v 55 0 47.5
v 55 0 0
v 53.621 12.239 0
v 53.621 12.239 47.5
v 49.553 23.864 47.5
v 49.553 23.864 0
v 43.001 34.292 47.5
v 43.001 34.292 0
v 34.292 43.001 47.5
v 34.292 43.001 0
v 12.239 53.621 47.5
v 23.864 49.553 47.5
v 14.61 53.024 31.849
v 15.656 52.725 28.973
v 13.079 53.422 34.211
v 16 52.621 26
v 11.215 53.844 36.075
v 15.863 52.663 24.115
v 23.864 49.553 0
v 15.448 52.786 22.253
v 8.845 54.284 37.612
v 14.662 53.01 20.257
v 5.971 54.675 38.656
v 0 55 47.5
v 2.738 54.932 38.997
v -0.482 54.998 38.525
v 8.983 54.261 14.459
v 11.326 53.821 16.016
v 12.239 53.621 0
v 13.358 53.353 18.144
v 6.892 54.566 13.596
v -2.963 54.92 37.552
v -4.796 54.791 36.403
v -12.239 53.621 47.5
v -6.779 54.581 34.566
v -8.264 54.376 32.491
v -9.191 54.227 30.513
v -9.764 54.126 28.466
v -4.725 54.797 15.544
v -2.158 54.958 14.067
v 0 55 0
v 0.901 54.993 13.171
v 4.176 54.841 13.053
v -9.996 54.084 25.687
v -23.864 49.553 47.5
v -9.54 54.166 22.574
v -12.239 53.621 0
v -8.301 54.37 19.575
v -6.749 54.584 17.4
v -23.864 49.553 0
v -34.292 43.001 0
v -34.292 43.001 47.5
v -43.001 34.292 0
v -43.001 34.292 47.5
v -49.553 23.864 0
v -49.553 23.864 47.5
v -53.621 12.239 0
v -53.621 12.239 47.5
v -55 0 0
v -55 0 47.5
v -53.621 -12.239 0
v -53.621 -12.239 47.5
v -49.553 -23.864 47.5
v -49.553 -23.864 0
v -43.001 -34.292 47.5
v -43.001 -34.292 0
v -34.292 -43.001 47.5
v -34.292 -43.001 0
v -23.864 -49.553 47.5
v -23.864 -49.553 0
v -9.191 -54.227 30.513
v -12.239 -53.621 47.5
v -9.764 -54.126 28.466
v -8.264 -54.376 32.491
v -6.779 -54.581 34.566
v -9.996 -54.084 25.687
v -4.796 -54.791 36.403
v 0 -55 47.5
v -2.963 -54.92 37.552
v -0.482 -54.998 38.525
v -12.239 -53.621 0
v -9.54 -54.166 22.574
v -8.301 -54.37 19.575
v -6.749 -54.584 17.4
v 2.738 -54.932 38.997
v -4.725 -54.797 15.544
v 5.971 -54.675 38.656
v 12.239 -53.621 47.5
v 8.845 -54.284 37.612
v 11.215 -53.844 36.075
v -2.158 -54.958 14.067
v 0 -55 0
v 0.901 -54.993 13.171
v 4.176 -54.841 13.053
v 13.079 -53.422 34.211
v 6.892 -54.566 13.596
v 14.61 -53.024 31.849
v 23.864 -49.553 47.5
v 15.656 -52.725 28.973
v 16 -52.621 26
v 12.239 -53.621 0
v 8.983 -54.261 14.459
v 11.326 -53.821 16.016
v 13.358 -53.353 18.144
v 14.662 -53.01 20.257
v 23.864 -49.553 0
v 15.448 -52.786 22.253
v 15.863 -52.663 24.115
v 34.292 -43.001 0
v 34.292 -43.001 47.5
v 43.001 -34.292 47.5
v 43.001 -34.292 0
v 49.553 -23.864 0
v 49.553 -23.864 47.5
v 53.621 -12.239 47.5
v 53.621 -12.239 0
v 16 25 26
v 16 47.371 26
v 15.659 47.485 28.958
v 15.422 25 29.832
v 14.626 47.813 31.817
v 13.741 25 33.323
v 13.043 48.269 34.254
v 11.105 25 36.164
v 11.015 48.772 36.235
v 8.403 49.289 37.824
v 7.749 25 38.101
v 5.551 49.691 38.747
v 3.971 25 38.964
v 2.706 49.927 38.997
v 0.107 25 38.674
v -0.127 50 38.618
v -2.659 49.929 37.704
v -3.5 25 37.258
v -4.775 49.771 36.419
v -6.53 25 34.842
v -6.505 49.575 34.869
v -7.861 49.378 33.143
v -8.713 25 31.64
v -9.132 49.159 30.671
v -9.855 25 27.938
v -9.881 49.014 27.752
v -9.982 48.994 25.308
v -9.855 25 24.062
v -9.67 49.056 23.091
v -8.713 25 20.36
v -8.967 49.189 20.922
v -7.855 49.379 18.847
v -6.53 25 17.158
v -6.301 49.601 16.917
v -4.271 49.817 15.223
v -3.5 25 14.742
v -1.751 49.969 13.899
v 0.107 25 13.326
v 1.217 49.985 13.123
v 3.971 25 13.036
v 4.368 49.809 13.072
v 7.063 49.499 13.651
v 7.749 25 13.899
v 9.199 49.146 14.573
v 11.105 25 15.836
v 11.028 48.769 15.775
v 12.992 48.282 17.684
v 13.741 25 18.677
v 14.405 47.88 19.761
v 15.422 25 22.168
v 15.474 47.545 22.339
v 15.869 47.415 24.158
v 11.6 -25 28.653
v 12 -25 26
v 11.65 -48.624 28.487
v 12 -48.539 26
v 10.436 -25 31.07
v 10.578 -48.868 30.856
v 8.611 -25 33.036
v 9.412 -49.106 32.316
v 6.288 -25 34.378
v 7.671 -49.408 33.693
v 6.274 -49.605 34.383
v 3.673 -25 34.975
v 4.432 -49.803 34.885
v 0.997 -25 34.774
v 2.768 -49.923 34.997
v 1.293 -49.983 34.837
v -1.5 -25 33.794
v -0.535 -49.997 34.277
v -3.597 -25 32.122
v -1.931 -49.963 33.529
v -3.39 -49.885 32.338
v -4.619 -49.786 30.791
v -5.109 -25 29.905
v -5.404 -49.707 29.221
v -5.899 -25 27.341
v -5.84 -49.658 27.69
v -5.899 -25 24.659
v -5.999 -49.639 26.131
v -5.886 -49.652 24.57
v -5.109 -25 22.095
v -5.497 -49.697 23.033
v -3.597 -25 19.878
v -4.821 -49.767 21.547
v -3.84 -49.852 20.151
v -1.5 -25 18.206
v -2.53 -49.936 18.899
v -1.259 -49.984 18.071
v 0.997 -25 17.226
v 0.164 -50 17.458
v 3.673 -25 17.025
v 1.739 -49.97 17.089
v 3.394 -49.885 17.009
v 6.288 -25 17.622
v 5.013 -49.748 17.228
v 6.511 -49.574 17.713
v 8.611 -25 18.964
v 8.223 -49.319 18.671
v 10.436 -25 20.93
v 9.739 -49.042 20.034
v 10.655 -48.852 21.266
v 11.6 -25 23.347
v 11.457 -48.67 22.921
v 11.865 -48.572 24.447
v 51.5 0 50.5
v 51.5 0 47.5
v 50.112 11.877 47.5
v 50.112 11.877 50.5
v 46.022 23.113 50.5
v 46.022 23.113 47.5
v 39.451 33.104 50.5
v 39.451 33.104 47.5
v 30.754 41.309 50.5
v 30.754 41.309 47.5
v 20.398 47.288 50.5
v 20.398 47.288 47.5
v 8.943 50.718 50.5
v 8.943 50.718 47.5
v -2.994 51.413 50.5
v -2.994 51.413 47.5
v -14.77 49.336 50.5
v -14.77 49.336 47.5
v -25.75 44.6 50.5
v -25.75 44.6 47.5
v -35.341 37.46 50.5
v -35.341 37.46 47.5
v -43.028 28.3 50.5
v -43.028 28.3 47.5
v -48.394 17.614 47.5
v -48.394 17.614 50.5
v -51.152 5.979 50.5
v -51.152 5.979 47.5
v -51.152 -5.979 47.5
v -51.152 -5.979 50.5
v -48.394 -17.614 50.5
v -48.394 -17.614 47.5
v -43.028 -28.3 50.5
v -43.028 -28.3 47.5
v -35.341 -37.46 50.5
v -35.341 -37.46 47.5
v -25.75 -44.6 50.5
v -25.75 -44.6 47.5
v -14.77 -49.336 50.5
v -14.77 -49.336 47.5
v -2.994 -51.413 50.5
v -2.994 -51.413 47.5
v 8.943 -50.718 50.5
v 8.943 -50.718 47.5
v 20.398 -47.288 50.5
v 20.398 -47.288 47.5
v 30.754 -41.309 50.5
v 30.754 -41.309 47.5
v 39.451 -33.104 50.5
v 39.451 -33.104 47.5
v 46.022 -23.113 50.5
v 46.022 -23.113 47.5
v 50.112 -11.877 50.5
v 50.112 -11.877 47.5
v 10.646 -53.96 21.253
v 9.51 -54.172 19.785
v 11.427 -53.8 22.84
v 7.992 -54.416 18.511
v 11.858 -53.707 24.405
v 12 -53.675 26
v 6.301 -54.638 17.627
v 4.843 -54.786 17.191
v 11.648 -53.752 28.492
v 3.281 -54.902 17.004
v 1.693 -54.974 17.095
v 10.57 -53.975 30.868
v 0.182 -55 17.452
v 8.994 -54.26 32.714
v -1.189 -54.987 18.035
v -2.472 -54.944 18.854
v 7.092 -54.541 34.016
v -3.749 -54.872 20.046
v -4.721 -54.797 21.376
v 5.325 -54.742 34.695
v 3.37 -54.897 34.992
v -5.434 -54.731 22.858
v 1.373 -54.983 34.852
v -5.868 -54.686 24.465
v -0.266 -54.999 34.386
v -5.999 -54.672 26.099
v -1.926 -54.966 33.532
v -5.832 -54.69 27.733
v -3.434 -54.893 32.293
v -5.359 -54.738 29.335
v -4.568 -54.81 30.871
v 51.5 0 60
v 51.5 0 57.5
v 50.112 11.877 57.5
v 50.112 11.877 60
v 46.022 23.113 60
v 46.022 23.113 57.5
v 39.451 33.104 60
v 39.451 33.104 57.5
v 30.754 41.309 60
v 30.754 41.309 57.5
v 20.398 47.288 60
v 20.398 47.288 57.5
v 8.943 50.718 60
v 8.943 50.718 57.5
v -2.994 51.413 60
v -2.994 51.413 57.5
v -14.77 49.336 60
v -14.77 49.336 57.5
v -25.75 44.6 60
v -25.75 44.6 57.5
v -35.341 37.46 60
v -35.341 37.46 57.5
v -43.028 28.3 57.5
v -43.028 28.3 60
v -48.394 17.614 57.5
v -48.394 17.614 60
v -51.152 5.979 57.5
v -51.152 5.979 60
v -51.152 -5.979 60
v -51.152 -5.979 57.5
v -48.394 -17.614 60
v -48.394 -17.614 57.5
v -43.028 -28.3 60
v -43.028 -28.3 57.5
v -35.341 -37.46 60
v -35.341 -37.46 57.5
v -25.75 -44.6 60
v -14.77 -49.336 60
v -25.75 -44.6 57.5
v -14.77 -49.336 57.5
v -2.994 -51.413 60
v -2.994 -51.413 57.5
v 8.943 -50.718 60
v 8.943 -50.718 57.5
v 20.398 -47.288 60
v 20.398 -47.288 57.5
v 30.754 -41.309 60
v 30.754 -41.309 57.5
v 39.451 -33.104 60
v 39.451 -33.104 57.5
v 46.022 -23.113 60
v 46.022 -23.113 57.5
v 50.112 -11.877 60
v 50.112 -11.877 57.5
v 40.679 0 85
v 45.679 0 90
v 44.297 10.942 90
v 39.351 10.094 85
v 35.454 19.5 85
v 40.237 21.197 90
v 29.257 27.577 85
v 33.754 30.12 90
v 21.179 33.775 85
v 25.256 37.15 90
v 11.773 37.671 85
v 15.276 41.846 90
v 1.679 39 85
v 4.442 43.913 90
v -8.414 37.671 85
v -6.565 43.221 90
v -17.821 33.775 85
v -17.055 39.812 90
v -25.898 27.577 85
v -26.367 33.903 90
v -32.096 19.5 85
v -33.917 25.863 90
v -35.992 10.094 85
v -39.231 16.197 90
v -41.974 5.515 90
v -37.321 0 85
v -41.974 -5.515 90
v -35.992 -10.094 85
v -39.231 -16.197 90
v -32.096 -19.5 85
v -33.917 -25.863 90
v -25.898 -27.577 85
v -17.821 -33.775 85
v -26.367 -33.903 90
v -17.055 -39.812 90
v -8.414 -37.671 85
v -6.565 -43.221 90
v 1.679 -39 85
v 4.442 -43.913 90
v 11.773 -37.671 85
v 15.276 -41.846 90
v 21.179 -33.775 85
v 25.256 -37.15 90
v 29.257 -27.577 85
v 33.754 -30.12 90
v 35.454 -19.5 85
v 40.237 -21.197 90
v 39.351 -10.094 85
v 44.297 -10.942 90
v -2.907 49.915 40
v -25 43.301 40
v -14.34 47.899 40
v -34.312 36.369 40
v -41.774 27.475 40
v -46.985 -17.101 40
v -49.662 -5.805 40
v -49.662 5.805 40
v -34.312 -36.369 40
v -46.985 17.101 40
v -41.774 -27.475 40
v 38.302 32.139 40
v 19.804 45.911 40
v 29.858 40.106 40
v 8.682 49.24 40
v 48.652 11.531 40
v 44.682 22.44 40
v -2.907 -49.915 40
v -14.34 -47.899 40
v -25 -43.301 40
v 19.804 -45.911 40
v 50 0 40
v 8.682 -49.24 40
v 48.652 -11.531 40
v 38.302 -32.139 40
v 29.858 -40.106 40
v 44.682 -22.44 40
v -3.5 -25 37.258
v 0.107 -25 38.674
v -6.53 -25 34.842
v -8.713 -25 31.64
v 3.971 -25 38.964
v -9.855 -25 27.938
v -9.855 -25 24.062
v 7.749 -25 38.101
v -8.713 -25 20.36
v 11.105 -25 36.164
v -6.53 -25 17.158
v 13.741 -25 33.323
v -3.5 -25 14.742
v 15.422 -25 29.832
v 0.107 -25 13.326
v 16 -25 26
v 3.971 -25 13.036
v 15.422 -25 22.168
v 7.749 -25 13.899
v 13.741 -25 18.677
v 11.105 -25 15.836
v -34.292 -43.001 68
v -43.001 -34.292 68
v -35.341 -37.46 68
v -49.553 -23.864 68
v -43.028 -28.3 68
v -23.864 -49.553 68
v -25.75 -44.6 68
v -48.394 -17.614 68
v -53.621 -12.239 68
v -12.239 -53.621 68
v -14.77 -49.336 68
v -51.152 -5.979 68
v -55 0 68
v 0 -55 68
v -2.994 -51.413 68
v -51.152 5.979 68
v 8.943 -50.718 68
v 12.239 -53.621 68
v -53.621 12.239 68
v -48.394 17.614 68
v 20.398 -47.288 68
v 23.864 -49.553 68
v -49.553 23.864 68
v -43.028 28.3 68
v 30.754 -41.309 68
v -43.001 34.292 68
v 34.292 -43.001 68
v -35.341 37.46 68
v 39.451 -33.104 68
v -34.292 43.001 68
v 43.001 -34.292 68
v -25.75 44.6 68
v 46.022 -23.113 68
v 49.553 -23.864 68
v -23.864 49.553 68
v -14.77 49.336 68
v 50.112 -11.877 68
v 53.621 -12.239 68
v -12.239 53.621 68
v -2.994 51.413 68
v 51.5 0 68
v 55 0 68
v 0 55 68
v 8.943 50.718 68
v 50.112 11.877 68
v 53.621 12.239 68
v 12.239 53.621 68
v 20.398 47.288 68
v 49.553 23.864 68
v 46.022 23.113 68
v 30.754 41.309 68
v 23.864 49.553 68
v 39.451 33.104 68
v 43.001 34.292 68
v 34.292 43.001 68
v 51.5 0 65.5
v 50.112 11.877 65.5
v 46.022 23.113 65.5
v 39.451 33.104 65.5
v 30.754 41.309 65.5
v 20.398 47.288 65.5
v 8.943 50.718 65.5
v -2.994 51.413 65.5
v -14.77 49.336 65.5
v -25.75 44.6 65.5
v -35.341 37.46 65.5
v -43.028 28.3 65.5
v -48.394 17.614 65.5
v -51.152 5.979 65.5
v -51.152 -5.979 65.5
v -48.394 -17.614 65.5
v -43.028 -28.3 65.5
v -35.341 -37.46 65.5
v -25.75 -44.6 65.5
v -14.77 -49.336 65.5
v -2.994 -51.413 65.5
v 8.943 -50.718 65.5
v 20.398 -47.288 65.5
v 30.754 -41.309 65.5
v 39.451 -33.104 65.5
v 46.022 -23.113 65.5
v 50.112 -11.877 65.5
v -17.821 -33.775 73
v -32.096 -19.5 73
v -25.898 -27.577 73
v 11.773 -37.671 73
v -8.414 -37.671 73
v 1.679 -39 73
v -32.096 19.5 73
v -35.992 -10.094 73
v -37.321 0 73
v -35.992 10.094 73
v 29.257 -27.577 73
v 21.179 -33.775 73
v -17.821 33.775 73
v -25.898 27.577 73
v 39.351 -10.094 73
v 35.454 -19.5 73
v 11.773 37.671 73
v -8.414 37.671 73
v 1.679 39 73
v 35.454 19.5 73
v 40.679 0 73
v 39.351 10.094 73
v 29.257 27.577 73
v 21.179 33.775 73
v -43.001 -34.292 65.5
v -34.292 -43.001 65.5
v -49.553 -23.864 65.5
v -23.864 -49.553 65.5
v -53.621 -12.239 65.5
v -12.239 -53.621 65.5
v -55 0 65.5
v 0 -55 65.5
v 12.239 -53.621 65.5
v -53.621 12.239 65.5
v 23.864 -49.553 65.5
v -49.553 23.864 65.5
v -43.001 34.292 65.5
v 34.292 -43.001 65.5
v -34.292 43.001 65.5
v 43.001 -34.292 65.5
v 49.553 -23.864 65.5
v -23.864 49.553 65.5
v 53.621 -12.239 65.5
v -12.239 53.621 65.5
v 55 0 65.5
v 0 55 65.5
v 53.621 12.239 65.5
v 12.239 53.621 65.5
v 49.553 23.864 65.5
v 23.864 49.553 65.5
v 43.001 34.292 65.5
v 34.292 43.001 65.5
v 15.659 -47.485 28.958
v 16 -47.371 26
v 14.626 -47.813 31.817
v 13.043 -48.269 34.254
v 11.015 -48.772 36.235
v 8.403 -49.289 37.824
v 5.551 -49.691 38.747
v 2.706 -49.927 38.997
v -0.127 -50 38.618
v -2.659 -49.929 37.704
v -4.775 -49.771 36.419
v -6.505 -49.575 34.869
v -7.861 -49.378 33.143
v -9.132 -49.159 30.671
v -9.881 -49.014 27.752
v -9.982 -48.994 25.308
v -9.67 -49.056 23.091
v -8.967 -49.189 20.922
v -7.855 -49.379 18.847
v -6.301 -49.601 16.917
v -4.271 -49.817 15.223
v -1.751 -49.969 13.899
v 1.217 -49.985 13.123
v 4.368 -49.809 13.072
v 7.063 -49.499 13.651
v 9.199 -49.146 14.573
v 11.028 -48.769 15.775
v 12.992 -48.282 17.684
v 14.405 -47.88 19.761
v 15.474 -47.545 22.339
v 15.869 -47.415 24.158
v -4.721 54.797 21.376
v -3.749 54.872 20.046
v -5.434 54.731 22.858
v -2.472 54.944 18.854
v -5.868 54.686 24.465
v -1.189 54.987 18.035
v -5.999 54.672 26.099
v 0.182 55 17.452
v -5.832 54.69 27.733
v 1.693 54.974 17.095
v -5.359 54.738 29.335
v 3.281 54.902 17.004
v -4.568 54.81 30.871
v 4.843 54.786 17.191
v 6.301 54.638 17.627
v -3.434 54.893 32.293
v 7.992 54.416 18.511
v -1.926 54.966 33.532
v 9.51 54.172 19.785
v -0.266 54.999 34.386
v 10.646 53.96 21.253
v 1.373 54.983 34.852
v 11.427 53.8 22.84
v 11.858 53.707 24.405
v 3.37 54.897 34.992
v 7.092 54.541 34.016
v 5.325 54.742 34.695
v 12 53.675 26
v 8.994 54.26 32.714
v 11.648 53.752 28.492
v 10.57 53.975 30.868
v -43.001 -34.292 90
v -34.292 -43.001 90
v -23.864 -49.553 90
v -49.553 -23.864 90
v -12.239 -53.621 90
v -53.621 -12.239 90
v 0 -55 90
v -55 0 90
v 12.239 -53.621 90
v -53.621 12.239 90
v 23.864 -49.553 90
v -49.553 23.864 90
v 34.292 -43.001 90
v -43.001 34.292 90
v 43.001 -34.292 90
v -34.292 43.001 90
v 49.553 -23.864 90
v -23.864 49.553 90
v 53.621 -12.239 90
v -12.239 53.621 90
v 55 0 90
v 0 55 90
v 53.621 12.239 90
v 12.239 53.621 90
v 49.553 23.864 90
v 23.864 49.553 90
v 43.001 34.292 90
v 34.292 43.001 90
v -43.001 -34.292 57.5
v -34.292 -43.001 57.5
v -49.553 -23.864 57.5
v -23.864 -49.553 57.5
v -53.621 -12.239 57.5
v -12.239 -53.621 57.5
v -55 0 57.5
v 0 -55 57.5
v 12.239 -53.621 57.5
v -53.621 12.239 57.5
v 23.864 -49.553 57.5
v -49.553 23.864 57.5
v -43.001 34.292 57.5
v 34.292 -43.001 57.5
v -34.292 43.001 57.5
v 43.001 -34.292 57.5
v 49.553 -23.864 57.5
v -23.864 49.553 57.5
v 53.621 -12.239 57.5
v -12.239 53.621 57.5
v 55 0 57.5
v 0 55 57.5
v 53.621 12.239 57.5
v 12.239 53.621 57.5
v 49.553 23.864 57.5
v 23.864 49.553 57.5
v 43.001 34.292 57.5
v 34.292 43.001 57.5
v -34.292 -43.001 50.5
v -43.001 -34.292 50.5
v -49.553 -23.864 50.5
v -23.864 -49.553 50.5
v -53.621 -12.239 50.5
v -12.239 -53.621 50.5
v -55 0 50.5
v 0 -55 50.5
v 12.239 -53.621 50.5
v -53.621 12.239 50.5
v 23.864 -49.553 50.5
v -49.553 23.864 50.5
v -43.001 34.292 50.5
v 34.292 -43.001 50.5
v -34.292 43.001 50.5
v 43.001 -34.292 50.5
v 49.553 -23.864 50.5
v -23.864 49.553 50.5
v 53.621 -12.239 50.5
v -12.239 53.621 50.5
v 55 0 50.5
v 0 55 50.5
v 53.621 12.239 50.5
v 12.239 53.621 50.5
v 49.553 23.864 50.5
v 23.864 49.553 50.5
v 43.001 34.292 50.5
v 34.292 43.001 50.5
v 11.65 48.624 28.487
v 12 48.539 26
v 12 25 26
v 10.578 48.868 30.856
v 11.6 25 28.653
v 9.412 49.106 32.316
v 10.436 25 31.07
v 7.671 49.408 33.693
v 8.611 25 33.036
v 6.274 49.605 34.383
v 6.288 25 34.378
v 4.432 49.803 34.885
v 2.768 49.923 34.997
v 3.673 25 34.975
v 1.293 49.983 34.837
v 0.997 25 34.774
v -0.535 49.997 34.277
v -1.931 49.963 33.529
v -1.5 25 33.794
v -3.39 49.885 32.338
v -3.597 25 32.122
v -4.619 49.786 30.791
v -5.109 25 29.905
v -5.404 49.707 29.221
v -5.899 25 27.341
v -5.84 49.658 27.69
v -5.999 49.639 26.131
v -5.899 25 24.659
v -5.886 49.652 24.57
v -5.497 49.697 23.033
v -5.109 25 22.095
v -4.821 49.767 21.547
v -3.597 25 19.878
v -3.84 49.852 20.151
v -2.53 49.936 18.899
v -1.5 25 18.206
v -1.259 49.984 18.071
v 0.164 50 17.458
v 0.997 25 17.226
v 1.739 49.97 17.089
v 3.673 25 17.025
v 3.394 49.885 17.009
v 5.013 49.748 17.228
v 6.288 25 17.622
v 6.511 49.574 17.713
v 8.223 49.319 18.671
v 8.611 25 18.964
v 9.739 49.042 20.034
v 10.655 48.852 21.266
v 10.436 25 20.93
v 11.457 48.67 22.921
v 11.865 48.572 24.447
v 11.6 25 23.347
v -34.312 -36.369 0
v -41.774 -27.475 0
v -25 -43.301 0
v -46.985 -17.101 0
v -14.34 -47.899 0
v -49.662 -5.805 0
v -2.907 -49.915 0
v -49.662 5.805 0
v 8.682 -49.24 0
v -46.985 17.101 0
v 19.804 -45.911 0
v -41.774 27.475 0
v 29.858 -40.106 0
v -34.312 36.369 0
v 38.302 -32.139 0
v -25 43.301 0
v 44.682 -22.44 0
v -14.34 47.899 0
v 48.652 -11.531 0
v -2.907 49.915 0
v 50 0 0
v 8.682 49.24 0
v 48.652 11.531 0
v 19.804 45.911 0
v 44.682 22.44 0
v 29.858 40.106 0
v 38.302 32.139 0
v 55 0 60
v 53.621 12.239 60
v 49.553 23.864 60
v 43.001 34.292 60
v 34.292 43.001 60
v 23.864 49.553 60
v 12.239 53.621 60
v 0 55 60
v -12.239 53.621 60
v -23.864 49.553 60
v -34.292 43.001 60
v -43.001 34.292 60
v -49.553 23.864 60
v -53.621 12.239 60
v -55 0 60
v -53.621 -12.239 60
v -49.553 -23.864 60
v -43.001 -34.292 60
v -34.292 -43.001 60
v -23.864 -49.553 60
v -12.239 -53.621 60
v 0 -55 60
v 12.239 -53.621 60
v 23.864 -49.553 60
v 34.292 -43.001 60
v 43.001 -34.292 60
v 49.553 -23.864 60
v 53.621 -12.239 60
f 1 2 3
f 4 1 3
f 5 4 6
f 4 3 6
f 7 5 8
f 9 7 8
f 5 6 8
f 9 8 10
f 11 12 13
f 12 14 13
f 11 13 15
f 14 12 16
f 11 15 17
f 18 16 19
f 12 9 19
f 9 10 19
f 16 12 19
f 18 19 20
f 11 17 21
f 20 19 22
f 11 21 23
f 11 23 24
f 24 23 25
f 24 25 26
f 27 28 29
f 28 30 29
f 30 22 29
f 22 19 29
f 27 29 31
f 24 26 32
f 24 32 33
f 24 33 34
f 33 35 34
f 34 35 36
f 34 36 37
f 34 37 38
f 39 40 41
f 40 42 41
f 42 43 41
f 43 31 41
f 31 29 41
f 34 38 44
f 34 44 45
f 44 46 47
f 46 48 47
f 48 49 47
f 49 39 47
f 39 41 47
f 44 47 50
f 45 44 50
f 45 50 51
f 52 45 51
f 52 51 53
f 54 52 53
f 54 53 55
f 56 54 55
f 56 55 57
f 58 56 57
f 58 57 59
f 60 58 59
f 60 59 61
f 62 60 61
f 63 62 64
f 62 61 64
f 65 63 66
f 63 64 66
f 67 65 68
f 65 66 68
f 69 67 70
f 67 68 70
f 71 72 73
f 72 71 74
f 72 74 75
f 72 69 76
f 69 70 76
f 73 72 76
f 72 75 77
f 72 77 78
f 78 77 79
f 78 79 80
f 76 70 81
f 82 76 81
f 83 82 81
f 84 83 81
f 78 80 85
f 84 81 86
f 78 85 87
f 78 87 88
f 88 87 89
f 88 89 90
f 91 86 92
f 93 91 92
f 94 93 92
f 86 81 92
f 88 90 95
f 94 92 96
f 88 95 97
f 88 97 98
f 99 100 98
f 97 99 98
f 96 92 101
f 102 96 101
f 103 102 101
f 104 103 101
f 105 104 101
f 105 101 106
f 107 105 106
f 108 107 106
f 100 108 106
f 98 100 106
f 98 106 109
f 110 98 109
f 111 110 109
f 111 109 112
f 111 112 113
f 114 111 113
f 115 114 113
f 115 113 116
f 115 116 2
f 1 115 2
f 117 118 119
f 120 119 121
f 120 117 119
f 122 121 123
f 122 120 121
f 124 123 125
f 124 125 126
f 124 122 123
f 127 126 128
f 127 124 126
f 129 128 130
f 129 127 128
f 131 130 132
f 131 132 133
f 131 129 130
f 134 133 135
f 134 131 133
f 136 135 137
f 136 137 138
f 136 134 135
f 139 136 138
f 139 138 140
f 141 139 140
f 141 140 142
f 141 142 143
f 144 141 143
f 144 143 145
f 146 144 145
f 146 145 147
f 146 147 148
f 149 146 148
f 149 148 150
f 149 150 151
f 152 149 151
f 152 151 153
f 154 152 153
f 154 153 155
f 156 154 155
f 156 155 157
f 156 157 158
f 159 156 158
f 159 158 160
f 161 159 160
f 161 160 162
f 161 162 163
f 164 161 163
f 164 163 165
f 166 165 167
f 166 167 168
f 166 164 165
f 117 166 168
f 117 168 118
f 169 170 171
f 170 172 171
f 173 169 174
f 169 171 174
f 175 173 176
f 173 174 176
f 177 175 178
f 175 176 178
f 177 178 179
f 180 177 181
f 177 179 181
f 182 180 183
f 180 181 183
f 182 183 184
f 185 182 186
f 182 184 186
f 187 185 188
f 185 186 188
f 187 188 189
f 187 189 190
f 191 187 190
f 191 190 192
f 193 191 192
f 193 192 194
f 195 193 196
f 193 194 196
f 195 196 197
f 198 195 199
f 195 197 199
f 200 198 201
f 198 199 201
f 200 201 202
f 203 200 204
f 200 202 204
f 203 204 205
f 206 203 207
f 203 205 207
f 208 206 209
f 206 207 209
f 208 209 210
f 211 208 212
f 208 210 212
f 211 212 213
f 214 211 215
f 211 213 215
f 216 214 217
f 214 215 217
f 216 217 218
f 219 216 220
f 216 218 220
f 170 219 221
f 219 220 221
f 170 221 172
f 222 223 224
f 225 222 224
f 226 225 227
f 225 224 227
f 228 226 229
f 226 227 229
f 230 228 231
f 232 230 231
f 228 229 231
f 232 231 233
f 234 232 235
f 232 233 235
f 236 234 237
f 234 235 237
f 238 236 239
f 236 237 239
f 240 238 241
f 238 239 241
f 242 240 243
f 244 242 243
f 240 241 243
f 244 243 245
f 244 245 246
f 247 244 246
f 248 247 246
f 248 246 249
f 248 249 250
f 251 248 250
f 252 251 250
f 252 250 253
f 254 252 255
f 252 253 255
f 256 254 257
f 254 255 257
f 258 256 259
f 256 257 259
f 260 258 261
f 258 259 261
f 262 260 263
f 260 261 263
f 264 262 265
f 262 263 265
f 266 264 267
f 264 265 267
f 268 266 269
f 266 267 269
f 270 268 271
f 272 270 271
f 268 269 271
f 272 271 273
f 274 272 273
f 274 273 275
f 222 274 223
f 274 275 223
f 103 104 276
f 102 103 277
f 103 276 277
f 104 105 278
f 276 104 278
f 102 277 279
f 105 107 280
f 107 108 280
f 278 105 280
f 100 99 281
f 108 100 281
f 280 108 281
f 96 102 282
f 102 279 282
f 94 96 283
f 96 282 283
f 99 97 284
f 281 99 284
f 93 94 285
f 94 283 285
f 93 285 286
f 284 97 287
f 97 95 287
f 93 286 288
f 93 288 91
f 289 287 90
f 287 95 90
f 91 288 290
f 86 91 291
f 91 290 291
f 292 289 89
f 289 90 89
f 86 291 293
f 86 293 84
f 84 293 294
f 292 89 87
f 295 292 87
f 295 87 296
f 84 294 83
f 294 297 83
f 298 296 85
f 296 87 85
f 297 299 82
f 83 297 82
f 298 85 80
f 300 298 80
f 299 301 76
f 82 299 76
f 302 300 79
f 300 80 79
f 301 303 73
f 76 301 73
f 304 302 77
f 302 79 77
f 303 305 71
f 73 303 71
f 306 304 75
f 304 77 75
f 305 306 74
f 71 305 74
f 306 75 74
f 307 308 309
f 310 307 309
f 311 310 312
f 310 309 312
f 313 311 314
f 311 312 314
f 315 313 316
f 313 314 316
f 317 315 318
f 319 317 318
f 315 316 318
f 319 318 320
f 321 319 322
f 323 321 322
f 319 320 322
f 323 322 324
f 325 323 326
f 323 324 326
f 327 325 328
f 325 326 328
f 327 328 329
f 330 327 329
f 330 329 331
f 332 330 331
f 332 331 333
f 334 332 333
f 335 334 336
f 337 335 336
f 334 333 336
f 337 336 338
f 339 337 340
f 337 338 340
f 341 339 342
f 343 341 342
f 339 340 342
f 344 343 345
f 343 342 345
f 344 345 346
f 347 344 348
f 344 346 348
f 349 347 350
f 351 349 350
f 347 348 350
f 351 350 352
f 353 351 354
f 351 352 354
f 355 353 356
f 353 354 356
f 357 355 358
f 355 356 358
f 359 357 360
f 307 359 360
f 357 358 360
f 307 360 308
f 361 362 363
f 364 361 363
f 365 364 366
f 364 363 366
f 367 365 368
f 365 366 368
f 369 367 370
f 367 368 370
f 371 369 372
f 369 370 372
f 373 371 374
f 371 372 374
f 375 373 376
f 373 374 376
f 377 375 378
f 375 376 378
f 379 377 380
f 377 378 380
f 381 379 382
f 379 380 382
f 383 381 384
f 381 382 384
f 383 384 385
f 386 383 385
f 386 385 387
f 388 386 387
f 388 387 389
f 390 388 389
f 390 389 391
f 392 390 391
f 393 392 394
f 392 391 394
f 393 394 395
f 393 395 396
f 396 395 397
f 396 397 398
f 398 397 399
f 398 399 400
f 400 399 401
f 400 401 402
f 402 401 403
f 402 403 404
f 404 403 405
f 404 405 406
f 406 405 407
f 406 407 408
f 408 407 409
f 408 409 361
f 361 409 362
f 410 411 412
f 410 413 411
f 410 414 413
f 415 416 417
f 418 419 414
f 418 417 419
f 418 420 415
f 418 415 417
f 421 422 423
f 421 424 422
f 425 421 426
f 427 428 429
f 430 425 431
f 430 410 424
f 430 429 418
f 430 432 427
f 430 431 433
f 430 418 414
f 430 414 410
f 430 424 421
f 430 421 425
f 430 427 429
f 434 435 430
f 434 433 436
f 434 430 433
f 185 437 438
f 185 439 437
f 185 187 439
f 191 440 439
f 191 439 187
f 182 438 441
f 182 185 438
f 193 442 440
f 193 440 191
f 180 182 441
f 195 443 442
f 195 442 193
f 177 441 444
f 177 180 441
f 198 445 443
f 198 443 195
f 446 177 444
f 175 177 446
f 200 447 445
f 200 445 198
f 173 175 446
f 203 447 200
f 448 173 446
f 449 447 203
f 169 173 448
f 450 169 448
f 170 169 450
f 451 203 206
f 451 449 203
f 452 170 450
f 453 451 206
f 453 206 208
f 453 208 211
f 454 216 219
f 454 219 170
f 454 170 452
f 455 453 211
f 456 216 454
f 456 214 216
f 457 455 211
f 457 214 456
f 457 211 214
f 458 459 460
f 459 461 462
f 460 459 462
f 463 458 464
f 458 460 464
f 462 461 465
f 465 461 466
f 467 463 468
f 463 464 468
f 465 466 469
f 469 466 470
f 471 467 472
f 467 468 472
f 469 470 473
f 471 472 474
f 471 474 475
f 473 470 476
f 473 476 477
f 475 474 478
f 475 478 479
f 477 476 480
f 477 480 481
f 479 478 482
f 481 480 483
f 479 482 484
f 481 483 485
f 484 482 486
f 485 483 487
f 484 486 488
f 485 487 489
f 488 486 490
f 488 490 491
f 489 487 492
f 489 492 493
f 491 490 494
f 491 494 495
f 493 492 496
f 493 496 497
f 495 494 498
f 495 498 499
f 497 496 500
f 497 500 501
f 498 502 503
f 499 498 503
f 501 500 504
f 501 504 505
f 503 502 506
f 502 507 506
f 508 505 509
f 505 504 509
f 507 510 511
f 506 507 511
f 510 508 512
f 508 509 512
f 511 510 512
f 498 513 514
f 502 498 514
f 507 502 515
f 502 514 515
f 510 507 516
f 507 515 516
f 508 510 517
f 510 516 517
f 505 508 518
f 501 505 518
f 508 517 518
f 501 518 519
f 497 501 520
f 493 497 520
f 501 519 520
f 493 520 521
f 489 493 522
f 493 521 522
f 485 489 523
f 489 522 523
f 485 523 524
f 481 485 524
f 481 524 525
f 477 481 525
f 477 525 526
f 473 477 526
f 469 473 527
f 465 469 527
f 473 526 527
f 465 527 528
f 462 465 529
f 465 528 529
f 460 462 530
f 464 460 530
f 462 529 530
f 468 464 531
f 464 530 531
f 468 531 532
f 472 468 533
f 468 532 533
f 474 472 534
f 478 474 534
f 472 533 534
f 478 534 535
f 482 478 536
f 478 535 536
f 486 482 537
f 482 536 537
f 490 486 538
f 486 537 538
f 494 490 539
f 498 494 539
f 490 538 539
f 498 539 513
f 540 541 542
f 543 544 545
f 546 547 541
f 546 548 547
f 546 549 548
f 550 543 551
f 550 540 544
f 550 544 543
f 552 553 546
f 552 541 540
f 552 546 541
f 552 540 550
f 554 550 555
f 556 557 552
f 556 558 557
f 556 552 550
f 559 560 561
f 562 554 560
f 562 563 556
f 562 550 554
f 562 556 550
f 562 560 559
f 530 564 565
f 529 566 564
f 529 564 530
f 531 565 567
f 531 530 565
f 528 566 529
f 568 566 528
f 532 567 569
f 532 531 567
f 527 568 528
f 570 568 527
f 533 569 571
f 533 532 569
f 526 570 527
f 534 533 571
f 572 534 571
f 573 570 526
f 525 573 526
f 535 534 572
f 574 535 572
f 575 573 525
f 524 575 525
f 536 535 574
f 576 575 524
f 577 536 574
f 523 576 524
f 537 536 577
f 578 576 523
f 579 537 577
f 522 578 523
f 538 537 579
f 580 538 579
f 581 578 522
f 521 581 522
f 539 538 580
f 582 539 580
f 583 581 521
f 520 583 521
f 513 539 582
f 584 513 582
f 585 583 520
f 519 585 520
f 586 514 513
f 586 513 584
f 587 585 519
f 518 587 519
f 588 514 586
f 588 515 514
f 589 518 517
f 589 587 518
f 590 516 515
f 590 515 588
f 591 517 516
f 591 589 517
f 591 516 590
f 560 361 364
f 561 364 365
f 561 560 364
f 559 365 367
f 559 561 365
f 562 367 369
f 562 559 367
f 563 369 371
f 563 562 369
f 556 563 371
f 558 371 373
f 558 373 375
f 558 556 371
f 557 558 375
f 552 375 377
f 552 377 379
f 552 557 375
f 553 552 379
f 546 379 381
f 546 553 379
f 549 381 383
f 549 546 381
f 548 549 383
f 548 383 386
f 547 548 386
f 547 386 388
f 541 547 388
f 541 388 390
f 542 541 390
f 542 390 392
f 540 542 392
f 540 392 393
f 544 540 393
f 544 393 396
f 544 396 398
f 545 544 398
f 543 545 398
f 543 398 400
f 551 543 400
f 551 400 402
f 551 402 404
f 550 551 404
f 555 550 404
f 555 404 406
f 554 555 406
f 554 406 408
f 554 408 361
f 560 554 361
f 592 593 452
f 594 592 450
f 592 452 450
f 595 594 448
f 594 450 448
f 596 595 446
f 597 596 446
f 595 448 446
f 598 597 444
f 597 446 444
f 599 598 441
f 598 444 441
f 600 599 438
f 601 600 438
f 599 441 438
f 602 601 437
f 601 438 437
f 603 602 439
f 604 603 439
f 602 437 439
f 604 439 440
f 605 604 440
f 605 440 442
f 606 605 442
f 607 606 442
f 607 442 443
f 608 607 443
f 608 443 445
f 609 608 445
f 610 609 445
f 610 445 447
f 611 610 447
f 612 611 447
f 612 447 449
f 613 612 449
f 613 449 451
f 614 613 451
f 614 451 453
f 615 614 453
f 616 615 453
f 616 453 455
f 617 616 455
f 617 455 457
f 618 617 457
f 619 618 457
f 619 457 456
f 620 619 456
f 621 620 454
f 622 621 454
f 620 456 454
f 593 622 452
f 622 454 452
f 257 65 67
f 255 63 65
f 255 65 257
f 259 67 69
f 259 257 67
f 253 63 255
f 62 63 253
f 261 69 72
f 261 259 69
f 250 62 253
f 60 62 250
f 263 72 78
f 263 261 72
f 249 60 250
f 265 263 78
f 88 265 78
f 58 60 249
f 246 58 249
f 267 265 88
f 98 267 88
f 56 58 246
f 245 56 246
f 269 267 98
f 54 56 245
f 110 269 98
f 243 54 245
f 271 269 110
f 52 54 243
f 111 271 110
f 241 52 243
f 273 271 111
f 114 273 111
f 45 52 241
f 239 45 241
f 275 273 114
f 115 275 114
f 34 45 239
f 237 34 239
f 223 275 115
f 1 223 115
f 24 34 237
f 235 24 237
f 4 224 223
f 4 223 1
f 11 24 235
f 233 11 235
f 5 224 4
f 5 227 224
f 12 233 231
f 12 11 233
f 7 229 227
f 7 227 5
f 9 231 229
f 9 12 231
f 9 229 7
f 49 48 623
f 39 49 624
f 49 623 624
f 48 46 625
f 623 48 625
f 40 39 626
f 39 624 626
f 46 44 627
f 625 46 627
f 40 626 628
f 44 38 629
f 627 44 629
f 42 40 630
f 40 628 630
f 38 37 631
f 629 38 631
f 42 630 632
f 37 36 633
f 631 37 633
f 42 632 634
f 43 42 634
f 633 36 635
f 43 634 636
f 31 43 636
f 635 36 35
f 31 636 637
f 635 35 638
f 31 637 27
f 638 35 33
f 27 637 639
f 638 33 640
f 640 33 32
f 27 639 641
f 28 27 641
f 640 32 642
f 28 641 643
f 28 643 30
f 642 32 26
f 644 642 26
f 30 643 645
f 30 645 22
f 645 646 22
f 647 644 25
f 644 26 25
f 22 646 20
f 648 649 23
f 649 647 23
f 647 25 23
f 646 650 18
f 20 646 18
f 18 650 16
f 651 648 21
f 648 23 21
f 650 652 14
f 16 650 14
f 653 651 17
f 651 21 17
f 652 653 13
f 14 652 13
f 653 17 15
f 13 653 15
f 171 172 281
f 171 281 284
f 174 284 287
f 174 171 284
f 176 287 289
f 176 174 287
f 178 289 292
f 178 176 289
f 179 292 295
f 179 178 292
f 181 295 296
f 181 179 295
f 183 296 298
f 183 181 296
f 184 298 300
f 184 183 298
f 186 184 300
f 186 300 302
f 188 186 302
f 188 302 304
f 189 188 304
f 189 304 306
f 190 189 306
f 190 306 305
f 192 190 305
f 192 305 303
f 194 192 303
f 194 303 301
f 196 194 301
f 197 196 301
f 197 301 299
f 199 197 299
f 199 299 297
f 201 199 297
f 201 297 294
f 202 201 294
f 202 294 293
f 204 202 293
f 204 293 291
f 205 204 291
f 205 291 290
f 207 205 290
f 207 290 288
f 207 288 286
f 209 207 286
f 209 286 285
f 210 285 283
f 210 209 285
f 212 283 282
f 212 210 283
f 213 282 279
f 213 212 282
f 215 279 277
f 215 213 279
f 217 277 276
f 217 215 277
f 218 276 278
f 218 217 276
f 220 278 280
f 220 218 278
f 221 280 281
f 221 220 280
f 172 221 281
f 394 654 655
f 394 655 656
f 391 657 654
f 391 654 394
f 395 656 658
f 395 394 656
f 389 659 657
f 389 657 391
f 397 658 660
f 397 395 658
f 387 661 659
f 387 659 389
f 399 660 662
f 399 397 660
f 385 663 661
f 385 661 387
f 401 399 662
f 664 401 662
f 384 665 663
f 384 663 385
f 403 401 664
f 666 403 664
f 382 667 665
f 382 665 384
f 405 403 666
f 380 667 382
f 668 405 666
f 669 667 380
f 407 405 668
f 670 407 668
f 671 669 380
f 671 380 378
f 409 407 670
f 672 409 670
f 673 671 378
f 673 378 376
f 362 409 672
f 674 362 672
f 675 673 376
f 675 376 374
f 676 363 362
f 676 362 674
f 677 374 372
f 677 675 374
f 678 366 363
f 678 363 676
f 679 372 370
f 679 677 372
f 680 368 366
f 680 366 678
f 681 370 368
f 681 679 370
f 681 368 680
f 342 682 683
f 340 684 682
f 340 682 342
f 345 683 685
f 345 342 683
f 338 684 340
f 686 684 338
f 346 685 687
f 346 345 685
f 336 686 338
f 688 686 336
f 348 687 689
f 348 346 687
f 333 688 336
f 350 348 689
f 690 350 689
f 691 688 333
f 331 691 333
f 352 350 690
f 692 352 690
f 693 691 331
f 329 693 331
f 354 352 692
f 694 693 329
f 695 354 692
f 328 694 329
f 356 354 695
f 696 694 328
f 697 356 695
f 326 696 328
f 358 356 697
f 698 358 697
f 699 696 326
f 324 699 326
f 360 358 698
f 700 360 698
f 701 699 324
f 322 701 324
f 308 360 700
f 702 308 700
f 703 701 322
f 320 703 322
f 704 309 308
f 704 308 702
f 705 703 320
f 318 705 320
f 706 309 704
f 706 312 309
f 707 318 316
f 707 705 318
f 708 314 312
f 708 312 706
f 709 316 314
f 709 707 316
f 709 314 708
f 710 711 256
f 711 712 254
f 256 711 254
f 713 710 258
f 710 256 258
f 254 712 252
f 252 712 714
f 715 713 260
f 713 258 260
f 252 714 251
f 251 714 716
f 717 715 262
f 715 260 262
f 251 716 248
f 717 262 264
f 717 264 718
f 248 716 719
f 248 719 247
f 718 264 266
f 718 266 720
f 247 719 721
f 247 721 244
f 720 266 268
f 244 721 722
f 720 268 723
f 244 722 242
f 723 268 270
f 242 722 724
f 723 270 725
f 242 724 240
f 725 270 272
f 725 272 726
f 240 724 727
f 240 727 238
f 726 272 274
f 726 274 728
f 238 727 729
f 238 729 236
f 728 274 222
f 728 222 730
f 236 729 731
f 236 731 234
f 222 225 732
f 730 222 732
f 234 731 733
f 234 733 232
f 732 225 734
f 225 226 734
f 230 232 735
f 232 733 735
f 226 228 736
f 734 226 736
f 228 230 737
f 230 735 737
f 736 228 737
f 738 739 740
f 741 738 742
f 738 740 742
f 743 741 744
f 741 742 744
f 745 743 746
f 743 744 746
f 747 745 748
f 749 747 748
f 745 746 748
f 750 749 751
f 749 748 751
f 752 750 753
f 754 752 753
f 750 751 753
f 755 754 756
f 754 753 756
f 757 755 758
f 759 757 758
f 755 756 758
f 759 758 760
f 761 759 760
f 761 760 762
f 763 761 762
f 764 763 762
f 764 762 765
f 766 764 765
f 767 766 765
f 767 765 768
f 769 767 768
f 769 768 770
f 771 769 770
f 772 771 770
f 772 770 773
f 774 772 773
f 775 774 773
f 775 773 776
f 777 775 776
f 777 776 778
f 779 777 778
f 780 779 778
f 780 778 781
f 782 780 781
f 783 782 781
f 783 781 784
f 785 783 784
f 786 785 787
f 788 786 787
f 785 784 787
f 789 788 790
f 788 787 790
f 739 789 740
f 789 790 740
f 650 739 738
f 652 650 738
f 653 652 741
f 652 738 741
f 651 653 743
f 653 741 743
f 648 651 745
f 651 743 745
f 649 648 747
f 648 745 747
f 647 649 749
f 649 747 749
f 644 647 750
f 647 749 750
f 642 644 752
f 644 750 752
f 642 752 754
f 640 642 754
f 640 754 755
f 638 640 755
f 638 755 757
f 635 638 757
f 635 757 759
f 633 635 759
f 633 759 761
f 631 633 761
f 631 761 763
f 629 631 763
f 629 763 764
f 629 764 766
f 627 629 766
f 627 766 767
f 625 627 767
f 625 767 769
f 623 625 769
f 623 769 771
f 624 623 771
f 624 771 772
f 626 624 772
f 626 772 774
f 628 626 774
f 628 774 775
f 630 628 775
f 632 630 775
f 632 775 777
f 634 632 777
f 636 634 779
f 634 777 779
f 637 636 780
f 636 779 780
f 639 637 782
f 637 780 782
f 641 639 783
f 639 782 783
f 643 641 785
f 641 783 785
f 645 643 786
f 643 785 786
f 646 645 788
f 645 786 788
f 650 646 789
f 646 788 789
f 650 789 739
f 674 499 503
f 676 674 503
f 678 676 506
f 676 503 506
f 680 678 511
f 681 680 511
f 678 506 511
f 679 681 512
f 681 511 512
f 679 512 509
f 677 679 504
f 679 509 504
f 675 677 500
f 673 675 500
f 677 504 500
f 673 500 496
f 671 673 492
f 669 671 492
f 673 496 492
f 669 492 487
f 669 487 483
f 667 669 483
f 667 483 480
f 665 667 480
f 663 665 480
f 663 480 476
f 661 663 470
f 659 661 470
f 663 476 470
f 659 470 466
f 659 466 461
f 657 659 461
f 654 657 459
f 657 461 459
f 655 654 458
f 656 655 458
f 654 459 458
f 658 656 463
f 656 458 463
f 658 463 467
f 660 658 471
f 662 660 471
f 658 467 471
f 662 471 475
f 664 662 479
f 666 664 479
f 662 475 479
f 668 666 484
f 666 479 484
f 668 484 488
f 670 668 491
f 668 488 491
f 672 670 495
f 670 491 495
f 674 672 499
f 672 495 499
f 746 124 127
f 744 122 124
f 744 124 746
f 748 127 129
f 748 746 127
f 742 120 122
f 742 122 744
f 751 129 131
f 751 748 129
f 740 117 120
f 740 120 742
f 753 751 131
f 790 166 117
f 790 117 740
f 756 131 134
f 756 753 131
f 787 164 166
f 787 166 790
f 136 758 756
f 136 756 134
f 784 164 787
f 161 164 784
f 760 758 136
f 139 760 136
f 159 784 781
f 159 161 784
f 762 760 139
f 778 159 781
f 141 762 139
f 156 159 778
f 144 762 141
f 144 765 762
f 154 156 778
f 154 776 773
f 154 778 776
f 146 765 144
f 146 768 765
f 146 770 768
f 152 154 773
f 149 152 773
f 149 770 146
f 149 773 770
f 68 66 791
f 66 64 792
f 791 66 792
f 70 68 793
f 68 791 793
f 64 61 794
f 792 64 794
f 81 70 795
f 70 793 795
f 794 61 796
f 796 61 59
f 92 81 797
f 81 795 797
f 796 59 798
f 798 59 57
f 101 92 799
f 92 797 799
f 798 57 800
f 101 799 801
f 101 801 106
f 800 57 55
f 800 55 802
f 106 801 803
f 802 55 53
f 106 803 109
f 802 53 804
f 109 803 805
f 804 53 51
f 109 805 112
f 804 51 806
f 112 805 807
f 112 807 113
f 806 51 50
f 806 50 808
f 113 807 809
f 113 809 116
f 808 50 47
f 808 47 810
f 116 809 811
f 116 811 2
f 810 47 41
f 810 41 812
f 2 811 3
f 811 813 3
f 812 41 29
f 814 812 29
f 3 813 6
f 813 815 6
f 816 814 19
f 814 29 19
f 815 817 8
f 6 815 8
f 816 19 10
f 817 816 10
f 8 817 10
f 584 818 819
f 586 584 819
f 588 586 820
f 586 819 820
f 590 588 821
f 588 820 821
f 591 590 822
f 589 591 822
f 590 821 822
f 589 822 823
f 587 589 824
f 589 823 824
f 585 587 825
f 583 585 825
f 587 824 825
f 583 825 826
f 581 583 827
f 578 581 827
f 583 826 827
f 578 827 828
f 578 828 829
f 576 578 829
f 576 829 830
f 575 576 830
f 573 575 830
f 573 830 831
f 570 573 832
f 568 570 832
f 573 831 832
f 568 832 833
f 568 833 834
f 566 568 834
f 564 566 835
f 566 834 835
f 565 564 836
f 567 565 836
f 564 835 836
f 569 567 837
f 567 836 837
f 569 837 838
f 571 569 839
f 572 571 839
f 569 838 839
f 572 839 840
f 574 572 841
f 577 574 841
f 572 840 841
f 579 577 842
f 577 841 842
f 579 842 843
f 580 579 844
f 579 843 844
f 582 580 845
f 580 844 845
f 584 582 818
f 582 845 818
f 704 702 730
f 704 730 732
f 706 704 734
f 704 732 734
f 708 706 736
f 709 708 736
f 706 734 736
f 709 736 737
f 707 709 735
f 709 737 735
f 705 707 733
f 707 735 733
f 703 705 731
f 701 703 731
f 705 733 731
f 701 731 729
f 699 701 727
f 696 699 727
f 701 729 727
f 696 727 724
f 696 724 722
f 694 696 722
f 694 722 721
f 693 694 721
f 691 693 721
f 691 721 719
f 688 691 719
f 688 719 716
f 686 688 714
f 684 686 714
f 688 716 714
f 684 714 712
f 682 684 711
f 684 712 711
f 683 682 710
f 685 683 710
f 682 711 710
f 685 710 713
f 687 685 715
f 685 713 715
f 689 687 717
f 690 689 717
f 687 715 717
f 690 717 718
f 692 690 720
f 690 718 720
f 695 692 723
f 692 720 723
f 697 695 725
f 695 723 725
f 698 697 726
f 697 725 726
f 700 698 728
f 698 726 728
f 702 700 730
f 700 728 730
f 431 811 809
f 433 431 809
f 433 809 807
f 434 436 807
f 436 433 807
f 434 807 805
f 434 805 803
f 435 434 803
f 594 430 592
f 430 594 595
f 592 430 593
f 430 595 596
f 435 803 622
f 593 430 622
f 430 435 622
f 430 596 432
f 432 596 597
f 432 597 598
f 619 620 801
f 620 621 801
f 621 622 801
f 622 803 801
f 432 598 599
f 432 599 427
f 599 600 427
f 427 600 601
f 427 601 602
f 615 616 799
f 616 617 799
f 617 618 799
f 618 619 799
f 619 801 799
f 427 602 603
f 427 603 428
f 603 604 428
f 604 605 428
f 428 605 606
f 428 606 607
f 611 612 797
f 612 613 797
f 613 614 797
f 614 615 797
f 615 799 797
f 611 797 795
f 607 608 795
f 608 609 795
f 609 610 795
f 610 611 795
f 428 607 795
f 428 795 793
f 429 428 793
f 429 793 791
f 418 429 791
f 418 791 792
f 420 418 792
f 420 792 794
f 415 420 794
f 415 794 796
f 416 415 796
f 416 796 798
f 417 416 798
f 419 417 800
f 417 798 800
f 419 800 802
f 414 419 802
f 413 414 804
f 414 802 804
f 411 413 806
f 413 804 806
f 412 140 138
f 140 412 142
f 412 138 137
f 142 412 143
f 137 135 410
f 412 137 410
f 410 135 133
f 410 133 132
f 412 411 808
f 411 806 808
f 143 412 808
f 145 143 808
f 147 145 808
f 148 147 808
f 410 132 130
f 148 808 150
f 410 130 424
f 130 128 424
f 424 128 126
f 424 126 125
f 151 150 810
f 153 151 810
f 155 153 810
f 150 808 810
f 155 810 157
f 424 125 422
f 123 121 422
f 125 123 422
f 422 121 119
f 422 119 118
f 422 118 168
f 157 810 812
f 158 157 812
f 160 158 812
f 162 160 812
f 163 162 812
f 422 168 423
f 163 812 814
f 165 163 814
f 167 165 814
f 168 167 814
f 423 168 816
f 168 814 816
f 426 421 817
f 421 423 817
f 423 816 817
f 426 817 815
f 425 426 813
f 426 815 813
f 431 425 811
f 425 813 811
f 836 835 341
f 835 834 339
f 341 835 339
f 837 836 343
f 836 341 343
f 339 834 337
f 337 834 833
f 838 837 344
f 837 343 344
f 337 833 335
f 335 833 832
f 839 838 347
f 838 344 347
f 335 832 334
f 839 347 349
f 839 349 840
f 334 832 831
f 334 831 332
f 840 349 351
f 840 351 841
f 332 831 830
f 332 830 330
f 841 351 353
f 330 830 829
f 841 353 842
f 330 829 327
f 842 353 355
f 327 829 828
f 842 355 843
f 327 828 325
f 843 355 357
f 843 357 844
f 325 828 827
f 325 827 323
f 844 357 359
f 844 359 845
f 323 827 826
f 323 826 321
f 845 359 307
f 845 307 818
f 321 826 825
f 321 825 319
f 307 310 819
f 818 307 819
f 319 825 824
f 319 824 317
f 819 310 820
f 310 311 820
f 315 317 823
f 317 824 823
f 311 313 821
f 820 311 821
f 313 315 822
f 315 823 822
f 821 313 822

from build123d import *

# Parameters (mm, degrees)
F0_R           = 55
F1_DEPTH       = 47.5
F2_R           = 51.5
F3_DEPTH       = 3
F4_R           = 55
F5_DEPTH       = 7
F6_R           = 51.5
F7_DEPTH       = 2.5
F8_R           = 55
F9_DEPTH       = 5.5
F10_R          = 51.5
F11_DEPTH      = 2.5
F12_R          = 55
F12_R_2        = 39
F13_DEPTH      = 22
F14_R          = 50
F15_DEPTH      = 40
F16_R          = 43.5007627275
F17_DEPTH      = 5
F18_SIZE       = 5
F19_R          = 13
F19_R_2        = 9
F20_DEPTH      = 62
F20_DEPTH_BACK = 70.1
F21_R          = 9
F22_DEPTH      = 75.8
F22_DEPTH_BACK = 99.3
F24_DEPTH      = 40
F25_R          = 82.1696032424
F25_R_2        = 55
F26_DEPTH      = 32.2


with BuildPart() as f1:
    # F0 (on Top) → F1 (new body)
    with BuildSketch(Plane.XY):
        Circle(F0_R)
    extrude(amount=F1_DEPTH)

    # F2 (on face) → F3 (join)
    with BuildSketch(Plane.XY.offset(47.5)):
        Circle(F2_R)
    extrude(amount=F3_DEPTH)

    # F4 (on face) → F5 (join)
    with BuildSketch(Plane.XY.offset(50.5)):
        Circle(F4_R)
    extrude(amount=F5_DEPTH)

    # F6 (on face) → F7 (join)
    with BuildSketch(Plane.XY.offset(57.5)):
        Circle(F6_R)
    extrude(amount=F7_DEPTH)

    # F8 (on face) → F9 (join)
    with BuildSketch(Plane.XY.offset(60)):
        Circle(F8_R)
    extrude(amount=F9_DEPTH)

    # F10 (on face) → F11 (join)
    with BuildSketch(Plane.XY.offset(65.5)):
        Circle(F10_R)
    extrude(amount=F11_DEPTH)

    # F12 (on face) → F13 (join)
    with BuildSketch(Plane.XY.offset(68)):
        Circle(F12_R)
        with Locations((1.679461333, 0)):
            Circle(F12_R_2, mode=Mode.SUBTRACT)
    extrude(amount=F13_DEPTH)

    # F14 (on face) → F15 (cut)
    with BuildSketch(Plane(origin=(0, 0, 0), x_dir=(1, 0, 0), z_dir=(0, 0, -1))):
        Circle(F14_R)
    extrude(amount=-F15_DEPTH, mode=Mode.SUBTRACT)

    # F16 (on face) → F17 (join)
    with BuildSketch(Plane.XY.offset(68)):
        Circle(F16_R)
    extrude(amount=F17_DEPTH)

    # F18
    f18_edges = [f1.edges().sort_by_distance(p)[0] for p in [
        (-37.320539, 0, 90),
    ]]
    chamfer(f18_edges, length=F18_SIZE)

    # F19 (on Front) → F20 (join, two sides)
    with BuildSketch(Plane.XZ) as f20_sk:
        with Locations((3, 26)):
            Circle(F19_R)
        with Locations((3, 26)):
            Circle(F19_R_2, mode=Mode.SUBTRACT)
    extrude(amount=F20_DEPTH)
    extrude(f20_sk.sketch, amount=-F20_DEPTH_BACK)

    # F21 (on Front) → F22 (cut, two sides)
    with BuildSketch(Plane.XZ) as f22_sk:
        with Locations((3, 26)):
            Circle(F21_R)
    extrude(amount=-F22_DEPTH, mode=Mode.SUBTRACT)
    extrude(f22_sk.sketch, amount=F22_DEPTH_BACK, mode=Mode.SUBTRACT)

    # F23 (on Top) → F24 (cut)
    with BuildSketch(Plane.XY):
        with BuildLine():
            Line((-10, 25), (-10, 48.9897948557))
            ThreePointArc((-10, 48.9897948557), (-50, 0), (-10, -48.9897948557))
            Line((-10, -48.9897948557), (-10, -25))
            Line((-10, -25), (16, -25))
            Line((16, -25), (16, -47.3708771293))
            ThreePointArc((16, -47.3708771293), (50, 0), (16, 47.3708771293))
            Line((16, 47.3708771293), (16, 25))
            Line((16, 25), (-10, 25))
        make_face()
    extrude(amount=F24_DEPTH, mode=Mode.SUBTRACT)

    # F25 (on face) → F26 (cut)
    with BuildSketch(Plane(origin=(0, 0, 40), x_dir=(1, 0, 0), z_dir=(0, 0, -1))):
        with Locations((0, -2.1747821011)):
            Circle(F25_R)
        Circle(F25_R_2, mode=Mode.SUBTRACT)
    extrude(amount=F26_DEPTH, mode=Mode.SUBTRACT)


solid = f1.part
